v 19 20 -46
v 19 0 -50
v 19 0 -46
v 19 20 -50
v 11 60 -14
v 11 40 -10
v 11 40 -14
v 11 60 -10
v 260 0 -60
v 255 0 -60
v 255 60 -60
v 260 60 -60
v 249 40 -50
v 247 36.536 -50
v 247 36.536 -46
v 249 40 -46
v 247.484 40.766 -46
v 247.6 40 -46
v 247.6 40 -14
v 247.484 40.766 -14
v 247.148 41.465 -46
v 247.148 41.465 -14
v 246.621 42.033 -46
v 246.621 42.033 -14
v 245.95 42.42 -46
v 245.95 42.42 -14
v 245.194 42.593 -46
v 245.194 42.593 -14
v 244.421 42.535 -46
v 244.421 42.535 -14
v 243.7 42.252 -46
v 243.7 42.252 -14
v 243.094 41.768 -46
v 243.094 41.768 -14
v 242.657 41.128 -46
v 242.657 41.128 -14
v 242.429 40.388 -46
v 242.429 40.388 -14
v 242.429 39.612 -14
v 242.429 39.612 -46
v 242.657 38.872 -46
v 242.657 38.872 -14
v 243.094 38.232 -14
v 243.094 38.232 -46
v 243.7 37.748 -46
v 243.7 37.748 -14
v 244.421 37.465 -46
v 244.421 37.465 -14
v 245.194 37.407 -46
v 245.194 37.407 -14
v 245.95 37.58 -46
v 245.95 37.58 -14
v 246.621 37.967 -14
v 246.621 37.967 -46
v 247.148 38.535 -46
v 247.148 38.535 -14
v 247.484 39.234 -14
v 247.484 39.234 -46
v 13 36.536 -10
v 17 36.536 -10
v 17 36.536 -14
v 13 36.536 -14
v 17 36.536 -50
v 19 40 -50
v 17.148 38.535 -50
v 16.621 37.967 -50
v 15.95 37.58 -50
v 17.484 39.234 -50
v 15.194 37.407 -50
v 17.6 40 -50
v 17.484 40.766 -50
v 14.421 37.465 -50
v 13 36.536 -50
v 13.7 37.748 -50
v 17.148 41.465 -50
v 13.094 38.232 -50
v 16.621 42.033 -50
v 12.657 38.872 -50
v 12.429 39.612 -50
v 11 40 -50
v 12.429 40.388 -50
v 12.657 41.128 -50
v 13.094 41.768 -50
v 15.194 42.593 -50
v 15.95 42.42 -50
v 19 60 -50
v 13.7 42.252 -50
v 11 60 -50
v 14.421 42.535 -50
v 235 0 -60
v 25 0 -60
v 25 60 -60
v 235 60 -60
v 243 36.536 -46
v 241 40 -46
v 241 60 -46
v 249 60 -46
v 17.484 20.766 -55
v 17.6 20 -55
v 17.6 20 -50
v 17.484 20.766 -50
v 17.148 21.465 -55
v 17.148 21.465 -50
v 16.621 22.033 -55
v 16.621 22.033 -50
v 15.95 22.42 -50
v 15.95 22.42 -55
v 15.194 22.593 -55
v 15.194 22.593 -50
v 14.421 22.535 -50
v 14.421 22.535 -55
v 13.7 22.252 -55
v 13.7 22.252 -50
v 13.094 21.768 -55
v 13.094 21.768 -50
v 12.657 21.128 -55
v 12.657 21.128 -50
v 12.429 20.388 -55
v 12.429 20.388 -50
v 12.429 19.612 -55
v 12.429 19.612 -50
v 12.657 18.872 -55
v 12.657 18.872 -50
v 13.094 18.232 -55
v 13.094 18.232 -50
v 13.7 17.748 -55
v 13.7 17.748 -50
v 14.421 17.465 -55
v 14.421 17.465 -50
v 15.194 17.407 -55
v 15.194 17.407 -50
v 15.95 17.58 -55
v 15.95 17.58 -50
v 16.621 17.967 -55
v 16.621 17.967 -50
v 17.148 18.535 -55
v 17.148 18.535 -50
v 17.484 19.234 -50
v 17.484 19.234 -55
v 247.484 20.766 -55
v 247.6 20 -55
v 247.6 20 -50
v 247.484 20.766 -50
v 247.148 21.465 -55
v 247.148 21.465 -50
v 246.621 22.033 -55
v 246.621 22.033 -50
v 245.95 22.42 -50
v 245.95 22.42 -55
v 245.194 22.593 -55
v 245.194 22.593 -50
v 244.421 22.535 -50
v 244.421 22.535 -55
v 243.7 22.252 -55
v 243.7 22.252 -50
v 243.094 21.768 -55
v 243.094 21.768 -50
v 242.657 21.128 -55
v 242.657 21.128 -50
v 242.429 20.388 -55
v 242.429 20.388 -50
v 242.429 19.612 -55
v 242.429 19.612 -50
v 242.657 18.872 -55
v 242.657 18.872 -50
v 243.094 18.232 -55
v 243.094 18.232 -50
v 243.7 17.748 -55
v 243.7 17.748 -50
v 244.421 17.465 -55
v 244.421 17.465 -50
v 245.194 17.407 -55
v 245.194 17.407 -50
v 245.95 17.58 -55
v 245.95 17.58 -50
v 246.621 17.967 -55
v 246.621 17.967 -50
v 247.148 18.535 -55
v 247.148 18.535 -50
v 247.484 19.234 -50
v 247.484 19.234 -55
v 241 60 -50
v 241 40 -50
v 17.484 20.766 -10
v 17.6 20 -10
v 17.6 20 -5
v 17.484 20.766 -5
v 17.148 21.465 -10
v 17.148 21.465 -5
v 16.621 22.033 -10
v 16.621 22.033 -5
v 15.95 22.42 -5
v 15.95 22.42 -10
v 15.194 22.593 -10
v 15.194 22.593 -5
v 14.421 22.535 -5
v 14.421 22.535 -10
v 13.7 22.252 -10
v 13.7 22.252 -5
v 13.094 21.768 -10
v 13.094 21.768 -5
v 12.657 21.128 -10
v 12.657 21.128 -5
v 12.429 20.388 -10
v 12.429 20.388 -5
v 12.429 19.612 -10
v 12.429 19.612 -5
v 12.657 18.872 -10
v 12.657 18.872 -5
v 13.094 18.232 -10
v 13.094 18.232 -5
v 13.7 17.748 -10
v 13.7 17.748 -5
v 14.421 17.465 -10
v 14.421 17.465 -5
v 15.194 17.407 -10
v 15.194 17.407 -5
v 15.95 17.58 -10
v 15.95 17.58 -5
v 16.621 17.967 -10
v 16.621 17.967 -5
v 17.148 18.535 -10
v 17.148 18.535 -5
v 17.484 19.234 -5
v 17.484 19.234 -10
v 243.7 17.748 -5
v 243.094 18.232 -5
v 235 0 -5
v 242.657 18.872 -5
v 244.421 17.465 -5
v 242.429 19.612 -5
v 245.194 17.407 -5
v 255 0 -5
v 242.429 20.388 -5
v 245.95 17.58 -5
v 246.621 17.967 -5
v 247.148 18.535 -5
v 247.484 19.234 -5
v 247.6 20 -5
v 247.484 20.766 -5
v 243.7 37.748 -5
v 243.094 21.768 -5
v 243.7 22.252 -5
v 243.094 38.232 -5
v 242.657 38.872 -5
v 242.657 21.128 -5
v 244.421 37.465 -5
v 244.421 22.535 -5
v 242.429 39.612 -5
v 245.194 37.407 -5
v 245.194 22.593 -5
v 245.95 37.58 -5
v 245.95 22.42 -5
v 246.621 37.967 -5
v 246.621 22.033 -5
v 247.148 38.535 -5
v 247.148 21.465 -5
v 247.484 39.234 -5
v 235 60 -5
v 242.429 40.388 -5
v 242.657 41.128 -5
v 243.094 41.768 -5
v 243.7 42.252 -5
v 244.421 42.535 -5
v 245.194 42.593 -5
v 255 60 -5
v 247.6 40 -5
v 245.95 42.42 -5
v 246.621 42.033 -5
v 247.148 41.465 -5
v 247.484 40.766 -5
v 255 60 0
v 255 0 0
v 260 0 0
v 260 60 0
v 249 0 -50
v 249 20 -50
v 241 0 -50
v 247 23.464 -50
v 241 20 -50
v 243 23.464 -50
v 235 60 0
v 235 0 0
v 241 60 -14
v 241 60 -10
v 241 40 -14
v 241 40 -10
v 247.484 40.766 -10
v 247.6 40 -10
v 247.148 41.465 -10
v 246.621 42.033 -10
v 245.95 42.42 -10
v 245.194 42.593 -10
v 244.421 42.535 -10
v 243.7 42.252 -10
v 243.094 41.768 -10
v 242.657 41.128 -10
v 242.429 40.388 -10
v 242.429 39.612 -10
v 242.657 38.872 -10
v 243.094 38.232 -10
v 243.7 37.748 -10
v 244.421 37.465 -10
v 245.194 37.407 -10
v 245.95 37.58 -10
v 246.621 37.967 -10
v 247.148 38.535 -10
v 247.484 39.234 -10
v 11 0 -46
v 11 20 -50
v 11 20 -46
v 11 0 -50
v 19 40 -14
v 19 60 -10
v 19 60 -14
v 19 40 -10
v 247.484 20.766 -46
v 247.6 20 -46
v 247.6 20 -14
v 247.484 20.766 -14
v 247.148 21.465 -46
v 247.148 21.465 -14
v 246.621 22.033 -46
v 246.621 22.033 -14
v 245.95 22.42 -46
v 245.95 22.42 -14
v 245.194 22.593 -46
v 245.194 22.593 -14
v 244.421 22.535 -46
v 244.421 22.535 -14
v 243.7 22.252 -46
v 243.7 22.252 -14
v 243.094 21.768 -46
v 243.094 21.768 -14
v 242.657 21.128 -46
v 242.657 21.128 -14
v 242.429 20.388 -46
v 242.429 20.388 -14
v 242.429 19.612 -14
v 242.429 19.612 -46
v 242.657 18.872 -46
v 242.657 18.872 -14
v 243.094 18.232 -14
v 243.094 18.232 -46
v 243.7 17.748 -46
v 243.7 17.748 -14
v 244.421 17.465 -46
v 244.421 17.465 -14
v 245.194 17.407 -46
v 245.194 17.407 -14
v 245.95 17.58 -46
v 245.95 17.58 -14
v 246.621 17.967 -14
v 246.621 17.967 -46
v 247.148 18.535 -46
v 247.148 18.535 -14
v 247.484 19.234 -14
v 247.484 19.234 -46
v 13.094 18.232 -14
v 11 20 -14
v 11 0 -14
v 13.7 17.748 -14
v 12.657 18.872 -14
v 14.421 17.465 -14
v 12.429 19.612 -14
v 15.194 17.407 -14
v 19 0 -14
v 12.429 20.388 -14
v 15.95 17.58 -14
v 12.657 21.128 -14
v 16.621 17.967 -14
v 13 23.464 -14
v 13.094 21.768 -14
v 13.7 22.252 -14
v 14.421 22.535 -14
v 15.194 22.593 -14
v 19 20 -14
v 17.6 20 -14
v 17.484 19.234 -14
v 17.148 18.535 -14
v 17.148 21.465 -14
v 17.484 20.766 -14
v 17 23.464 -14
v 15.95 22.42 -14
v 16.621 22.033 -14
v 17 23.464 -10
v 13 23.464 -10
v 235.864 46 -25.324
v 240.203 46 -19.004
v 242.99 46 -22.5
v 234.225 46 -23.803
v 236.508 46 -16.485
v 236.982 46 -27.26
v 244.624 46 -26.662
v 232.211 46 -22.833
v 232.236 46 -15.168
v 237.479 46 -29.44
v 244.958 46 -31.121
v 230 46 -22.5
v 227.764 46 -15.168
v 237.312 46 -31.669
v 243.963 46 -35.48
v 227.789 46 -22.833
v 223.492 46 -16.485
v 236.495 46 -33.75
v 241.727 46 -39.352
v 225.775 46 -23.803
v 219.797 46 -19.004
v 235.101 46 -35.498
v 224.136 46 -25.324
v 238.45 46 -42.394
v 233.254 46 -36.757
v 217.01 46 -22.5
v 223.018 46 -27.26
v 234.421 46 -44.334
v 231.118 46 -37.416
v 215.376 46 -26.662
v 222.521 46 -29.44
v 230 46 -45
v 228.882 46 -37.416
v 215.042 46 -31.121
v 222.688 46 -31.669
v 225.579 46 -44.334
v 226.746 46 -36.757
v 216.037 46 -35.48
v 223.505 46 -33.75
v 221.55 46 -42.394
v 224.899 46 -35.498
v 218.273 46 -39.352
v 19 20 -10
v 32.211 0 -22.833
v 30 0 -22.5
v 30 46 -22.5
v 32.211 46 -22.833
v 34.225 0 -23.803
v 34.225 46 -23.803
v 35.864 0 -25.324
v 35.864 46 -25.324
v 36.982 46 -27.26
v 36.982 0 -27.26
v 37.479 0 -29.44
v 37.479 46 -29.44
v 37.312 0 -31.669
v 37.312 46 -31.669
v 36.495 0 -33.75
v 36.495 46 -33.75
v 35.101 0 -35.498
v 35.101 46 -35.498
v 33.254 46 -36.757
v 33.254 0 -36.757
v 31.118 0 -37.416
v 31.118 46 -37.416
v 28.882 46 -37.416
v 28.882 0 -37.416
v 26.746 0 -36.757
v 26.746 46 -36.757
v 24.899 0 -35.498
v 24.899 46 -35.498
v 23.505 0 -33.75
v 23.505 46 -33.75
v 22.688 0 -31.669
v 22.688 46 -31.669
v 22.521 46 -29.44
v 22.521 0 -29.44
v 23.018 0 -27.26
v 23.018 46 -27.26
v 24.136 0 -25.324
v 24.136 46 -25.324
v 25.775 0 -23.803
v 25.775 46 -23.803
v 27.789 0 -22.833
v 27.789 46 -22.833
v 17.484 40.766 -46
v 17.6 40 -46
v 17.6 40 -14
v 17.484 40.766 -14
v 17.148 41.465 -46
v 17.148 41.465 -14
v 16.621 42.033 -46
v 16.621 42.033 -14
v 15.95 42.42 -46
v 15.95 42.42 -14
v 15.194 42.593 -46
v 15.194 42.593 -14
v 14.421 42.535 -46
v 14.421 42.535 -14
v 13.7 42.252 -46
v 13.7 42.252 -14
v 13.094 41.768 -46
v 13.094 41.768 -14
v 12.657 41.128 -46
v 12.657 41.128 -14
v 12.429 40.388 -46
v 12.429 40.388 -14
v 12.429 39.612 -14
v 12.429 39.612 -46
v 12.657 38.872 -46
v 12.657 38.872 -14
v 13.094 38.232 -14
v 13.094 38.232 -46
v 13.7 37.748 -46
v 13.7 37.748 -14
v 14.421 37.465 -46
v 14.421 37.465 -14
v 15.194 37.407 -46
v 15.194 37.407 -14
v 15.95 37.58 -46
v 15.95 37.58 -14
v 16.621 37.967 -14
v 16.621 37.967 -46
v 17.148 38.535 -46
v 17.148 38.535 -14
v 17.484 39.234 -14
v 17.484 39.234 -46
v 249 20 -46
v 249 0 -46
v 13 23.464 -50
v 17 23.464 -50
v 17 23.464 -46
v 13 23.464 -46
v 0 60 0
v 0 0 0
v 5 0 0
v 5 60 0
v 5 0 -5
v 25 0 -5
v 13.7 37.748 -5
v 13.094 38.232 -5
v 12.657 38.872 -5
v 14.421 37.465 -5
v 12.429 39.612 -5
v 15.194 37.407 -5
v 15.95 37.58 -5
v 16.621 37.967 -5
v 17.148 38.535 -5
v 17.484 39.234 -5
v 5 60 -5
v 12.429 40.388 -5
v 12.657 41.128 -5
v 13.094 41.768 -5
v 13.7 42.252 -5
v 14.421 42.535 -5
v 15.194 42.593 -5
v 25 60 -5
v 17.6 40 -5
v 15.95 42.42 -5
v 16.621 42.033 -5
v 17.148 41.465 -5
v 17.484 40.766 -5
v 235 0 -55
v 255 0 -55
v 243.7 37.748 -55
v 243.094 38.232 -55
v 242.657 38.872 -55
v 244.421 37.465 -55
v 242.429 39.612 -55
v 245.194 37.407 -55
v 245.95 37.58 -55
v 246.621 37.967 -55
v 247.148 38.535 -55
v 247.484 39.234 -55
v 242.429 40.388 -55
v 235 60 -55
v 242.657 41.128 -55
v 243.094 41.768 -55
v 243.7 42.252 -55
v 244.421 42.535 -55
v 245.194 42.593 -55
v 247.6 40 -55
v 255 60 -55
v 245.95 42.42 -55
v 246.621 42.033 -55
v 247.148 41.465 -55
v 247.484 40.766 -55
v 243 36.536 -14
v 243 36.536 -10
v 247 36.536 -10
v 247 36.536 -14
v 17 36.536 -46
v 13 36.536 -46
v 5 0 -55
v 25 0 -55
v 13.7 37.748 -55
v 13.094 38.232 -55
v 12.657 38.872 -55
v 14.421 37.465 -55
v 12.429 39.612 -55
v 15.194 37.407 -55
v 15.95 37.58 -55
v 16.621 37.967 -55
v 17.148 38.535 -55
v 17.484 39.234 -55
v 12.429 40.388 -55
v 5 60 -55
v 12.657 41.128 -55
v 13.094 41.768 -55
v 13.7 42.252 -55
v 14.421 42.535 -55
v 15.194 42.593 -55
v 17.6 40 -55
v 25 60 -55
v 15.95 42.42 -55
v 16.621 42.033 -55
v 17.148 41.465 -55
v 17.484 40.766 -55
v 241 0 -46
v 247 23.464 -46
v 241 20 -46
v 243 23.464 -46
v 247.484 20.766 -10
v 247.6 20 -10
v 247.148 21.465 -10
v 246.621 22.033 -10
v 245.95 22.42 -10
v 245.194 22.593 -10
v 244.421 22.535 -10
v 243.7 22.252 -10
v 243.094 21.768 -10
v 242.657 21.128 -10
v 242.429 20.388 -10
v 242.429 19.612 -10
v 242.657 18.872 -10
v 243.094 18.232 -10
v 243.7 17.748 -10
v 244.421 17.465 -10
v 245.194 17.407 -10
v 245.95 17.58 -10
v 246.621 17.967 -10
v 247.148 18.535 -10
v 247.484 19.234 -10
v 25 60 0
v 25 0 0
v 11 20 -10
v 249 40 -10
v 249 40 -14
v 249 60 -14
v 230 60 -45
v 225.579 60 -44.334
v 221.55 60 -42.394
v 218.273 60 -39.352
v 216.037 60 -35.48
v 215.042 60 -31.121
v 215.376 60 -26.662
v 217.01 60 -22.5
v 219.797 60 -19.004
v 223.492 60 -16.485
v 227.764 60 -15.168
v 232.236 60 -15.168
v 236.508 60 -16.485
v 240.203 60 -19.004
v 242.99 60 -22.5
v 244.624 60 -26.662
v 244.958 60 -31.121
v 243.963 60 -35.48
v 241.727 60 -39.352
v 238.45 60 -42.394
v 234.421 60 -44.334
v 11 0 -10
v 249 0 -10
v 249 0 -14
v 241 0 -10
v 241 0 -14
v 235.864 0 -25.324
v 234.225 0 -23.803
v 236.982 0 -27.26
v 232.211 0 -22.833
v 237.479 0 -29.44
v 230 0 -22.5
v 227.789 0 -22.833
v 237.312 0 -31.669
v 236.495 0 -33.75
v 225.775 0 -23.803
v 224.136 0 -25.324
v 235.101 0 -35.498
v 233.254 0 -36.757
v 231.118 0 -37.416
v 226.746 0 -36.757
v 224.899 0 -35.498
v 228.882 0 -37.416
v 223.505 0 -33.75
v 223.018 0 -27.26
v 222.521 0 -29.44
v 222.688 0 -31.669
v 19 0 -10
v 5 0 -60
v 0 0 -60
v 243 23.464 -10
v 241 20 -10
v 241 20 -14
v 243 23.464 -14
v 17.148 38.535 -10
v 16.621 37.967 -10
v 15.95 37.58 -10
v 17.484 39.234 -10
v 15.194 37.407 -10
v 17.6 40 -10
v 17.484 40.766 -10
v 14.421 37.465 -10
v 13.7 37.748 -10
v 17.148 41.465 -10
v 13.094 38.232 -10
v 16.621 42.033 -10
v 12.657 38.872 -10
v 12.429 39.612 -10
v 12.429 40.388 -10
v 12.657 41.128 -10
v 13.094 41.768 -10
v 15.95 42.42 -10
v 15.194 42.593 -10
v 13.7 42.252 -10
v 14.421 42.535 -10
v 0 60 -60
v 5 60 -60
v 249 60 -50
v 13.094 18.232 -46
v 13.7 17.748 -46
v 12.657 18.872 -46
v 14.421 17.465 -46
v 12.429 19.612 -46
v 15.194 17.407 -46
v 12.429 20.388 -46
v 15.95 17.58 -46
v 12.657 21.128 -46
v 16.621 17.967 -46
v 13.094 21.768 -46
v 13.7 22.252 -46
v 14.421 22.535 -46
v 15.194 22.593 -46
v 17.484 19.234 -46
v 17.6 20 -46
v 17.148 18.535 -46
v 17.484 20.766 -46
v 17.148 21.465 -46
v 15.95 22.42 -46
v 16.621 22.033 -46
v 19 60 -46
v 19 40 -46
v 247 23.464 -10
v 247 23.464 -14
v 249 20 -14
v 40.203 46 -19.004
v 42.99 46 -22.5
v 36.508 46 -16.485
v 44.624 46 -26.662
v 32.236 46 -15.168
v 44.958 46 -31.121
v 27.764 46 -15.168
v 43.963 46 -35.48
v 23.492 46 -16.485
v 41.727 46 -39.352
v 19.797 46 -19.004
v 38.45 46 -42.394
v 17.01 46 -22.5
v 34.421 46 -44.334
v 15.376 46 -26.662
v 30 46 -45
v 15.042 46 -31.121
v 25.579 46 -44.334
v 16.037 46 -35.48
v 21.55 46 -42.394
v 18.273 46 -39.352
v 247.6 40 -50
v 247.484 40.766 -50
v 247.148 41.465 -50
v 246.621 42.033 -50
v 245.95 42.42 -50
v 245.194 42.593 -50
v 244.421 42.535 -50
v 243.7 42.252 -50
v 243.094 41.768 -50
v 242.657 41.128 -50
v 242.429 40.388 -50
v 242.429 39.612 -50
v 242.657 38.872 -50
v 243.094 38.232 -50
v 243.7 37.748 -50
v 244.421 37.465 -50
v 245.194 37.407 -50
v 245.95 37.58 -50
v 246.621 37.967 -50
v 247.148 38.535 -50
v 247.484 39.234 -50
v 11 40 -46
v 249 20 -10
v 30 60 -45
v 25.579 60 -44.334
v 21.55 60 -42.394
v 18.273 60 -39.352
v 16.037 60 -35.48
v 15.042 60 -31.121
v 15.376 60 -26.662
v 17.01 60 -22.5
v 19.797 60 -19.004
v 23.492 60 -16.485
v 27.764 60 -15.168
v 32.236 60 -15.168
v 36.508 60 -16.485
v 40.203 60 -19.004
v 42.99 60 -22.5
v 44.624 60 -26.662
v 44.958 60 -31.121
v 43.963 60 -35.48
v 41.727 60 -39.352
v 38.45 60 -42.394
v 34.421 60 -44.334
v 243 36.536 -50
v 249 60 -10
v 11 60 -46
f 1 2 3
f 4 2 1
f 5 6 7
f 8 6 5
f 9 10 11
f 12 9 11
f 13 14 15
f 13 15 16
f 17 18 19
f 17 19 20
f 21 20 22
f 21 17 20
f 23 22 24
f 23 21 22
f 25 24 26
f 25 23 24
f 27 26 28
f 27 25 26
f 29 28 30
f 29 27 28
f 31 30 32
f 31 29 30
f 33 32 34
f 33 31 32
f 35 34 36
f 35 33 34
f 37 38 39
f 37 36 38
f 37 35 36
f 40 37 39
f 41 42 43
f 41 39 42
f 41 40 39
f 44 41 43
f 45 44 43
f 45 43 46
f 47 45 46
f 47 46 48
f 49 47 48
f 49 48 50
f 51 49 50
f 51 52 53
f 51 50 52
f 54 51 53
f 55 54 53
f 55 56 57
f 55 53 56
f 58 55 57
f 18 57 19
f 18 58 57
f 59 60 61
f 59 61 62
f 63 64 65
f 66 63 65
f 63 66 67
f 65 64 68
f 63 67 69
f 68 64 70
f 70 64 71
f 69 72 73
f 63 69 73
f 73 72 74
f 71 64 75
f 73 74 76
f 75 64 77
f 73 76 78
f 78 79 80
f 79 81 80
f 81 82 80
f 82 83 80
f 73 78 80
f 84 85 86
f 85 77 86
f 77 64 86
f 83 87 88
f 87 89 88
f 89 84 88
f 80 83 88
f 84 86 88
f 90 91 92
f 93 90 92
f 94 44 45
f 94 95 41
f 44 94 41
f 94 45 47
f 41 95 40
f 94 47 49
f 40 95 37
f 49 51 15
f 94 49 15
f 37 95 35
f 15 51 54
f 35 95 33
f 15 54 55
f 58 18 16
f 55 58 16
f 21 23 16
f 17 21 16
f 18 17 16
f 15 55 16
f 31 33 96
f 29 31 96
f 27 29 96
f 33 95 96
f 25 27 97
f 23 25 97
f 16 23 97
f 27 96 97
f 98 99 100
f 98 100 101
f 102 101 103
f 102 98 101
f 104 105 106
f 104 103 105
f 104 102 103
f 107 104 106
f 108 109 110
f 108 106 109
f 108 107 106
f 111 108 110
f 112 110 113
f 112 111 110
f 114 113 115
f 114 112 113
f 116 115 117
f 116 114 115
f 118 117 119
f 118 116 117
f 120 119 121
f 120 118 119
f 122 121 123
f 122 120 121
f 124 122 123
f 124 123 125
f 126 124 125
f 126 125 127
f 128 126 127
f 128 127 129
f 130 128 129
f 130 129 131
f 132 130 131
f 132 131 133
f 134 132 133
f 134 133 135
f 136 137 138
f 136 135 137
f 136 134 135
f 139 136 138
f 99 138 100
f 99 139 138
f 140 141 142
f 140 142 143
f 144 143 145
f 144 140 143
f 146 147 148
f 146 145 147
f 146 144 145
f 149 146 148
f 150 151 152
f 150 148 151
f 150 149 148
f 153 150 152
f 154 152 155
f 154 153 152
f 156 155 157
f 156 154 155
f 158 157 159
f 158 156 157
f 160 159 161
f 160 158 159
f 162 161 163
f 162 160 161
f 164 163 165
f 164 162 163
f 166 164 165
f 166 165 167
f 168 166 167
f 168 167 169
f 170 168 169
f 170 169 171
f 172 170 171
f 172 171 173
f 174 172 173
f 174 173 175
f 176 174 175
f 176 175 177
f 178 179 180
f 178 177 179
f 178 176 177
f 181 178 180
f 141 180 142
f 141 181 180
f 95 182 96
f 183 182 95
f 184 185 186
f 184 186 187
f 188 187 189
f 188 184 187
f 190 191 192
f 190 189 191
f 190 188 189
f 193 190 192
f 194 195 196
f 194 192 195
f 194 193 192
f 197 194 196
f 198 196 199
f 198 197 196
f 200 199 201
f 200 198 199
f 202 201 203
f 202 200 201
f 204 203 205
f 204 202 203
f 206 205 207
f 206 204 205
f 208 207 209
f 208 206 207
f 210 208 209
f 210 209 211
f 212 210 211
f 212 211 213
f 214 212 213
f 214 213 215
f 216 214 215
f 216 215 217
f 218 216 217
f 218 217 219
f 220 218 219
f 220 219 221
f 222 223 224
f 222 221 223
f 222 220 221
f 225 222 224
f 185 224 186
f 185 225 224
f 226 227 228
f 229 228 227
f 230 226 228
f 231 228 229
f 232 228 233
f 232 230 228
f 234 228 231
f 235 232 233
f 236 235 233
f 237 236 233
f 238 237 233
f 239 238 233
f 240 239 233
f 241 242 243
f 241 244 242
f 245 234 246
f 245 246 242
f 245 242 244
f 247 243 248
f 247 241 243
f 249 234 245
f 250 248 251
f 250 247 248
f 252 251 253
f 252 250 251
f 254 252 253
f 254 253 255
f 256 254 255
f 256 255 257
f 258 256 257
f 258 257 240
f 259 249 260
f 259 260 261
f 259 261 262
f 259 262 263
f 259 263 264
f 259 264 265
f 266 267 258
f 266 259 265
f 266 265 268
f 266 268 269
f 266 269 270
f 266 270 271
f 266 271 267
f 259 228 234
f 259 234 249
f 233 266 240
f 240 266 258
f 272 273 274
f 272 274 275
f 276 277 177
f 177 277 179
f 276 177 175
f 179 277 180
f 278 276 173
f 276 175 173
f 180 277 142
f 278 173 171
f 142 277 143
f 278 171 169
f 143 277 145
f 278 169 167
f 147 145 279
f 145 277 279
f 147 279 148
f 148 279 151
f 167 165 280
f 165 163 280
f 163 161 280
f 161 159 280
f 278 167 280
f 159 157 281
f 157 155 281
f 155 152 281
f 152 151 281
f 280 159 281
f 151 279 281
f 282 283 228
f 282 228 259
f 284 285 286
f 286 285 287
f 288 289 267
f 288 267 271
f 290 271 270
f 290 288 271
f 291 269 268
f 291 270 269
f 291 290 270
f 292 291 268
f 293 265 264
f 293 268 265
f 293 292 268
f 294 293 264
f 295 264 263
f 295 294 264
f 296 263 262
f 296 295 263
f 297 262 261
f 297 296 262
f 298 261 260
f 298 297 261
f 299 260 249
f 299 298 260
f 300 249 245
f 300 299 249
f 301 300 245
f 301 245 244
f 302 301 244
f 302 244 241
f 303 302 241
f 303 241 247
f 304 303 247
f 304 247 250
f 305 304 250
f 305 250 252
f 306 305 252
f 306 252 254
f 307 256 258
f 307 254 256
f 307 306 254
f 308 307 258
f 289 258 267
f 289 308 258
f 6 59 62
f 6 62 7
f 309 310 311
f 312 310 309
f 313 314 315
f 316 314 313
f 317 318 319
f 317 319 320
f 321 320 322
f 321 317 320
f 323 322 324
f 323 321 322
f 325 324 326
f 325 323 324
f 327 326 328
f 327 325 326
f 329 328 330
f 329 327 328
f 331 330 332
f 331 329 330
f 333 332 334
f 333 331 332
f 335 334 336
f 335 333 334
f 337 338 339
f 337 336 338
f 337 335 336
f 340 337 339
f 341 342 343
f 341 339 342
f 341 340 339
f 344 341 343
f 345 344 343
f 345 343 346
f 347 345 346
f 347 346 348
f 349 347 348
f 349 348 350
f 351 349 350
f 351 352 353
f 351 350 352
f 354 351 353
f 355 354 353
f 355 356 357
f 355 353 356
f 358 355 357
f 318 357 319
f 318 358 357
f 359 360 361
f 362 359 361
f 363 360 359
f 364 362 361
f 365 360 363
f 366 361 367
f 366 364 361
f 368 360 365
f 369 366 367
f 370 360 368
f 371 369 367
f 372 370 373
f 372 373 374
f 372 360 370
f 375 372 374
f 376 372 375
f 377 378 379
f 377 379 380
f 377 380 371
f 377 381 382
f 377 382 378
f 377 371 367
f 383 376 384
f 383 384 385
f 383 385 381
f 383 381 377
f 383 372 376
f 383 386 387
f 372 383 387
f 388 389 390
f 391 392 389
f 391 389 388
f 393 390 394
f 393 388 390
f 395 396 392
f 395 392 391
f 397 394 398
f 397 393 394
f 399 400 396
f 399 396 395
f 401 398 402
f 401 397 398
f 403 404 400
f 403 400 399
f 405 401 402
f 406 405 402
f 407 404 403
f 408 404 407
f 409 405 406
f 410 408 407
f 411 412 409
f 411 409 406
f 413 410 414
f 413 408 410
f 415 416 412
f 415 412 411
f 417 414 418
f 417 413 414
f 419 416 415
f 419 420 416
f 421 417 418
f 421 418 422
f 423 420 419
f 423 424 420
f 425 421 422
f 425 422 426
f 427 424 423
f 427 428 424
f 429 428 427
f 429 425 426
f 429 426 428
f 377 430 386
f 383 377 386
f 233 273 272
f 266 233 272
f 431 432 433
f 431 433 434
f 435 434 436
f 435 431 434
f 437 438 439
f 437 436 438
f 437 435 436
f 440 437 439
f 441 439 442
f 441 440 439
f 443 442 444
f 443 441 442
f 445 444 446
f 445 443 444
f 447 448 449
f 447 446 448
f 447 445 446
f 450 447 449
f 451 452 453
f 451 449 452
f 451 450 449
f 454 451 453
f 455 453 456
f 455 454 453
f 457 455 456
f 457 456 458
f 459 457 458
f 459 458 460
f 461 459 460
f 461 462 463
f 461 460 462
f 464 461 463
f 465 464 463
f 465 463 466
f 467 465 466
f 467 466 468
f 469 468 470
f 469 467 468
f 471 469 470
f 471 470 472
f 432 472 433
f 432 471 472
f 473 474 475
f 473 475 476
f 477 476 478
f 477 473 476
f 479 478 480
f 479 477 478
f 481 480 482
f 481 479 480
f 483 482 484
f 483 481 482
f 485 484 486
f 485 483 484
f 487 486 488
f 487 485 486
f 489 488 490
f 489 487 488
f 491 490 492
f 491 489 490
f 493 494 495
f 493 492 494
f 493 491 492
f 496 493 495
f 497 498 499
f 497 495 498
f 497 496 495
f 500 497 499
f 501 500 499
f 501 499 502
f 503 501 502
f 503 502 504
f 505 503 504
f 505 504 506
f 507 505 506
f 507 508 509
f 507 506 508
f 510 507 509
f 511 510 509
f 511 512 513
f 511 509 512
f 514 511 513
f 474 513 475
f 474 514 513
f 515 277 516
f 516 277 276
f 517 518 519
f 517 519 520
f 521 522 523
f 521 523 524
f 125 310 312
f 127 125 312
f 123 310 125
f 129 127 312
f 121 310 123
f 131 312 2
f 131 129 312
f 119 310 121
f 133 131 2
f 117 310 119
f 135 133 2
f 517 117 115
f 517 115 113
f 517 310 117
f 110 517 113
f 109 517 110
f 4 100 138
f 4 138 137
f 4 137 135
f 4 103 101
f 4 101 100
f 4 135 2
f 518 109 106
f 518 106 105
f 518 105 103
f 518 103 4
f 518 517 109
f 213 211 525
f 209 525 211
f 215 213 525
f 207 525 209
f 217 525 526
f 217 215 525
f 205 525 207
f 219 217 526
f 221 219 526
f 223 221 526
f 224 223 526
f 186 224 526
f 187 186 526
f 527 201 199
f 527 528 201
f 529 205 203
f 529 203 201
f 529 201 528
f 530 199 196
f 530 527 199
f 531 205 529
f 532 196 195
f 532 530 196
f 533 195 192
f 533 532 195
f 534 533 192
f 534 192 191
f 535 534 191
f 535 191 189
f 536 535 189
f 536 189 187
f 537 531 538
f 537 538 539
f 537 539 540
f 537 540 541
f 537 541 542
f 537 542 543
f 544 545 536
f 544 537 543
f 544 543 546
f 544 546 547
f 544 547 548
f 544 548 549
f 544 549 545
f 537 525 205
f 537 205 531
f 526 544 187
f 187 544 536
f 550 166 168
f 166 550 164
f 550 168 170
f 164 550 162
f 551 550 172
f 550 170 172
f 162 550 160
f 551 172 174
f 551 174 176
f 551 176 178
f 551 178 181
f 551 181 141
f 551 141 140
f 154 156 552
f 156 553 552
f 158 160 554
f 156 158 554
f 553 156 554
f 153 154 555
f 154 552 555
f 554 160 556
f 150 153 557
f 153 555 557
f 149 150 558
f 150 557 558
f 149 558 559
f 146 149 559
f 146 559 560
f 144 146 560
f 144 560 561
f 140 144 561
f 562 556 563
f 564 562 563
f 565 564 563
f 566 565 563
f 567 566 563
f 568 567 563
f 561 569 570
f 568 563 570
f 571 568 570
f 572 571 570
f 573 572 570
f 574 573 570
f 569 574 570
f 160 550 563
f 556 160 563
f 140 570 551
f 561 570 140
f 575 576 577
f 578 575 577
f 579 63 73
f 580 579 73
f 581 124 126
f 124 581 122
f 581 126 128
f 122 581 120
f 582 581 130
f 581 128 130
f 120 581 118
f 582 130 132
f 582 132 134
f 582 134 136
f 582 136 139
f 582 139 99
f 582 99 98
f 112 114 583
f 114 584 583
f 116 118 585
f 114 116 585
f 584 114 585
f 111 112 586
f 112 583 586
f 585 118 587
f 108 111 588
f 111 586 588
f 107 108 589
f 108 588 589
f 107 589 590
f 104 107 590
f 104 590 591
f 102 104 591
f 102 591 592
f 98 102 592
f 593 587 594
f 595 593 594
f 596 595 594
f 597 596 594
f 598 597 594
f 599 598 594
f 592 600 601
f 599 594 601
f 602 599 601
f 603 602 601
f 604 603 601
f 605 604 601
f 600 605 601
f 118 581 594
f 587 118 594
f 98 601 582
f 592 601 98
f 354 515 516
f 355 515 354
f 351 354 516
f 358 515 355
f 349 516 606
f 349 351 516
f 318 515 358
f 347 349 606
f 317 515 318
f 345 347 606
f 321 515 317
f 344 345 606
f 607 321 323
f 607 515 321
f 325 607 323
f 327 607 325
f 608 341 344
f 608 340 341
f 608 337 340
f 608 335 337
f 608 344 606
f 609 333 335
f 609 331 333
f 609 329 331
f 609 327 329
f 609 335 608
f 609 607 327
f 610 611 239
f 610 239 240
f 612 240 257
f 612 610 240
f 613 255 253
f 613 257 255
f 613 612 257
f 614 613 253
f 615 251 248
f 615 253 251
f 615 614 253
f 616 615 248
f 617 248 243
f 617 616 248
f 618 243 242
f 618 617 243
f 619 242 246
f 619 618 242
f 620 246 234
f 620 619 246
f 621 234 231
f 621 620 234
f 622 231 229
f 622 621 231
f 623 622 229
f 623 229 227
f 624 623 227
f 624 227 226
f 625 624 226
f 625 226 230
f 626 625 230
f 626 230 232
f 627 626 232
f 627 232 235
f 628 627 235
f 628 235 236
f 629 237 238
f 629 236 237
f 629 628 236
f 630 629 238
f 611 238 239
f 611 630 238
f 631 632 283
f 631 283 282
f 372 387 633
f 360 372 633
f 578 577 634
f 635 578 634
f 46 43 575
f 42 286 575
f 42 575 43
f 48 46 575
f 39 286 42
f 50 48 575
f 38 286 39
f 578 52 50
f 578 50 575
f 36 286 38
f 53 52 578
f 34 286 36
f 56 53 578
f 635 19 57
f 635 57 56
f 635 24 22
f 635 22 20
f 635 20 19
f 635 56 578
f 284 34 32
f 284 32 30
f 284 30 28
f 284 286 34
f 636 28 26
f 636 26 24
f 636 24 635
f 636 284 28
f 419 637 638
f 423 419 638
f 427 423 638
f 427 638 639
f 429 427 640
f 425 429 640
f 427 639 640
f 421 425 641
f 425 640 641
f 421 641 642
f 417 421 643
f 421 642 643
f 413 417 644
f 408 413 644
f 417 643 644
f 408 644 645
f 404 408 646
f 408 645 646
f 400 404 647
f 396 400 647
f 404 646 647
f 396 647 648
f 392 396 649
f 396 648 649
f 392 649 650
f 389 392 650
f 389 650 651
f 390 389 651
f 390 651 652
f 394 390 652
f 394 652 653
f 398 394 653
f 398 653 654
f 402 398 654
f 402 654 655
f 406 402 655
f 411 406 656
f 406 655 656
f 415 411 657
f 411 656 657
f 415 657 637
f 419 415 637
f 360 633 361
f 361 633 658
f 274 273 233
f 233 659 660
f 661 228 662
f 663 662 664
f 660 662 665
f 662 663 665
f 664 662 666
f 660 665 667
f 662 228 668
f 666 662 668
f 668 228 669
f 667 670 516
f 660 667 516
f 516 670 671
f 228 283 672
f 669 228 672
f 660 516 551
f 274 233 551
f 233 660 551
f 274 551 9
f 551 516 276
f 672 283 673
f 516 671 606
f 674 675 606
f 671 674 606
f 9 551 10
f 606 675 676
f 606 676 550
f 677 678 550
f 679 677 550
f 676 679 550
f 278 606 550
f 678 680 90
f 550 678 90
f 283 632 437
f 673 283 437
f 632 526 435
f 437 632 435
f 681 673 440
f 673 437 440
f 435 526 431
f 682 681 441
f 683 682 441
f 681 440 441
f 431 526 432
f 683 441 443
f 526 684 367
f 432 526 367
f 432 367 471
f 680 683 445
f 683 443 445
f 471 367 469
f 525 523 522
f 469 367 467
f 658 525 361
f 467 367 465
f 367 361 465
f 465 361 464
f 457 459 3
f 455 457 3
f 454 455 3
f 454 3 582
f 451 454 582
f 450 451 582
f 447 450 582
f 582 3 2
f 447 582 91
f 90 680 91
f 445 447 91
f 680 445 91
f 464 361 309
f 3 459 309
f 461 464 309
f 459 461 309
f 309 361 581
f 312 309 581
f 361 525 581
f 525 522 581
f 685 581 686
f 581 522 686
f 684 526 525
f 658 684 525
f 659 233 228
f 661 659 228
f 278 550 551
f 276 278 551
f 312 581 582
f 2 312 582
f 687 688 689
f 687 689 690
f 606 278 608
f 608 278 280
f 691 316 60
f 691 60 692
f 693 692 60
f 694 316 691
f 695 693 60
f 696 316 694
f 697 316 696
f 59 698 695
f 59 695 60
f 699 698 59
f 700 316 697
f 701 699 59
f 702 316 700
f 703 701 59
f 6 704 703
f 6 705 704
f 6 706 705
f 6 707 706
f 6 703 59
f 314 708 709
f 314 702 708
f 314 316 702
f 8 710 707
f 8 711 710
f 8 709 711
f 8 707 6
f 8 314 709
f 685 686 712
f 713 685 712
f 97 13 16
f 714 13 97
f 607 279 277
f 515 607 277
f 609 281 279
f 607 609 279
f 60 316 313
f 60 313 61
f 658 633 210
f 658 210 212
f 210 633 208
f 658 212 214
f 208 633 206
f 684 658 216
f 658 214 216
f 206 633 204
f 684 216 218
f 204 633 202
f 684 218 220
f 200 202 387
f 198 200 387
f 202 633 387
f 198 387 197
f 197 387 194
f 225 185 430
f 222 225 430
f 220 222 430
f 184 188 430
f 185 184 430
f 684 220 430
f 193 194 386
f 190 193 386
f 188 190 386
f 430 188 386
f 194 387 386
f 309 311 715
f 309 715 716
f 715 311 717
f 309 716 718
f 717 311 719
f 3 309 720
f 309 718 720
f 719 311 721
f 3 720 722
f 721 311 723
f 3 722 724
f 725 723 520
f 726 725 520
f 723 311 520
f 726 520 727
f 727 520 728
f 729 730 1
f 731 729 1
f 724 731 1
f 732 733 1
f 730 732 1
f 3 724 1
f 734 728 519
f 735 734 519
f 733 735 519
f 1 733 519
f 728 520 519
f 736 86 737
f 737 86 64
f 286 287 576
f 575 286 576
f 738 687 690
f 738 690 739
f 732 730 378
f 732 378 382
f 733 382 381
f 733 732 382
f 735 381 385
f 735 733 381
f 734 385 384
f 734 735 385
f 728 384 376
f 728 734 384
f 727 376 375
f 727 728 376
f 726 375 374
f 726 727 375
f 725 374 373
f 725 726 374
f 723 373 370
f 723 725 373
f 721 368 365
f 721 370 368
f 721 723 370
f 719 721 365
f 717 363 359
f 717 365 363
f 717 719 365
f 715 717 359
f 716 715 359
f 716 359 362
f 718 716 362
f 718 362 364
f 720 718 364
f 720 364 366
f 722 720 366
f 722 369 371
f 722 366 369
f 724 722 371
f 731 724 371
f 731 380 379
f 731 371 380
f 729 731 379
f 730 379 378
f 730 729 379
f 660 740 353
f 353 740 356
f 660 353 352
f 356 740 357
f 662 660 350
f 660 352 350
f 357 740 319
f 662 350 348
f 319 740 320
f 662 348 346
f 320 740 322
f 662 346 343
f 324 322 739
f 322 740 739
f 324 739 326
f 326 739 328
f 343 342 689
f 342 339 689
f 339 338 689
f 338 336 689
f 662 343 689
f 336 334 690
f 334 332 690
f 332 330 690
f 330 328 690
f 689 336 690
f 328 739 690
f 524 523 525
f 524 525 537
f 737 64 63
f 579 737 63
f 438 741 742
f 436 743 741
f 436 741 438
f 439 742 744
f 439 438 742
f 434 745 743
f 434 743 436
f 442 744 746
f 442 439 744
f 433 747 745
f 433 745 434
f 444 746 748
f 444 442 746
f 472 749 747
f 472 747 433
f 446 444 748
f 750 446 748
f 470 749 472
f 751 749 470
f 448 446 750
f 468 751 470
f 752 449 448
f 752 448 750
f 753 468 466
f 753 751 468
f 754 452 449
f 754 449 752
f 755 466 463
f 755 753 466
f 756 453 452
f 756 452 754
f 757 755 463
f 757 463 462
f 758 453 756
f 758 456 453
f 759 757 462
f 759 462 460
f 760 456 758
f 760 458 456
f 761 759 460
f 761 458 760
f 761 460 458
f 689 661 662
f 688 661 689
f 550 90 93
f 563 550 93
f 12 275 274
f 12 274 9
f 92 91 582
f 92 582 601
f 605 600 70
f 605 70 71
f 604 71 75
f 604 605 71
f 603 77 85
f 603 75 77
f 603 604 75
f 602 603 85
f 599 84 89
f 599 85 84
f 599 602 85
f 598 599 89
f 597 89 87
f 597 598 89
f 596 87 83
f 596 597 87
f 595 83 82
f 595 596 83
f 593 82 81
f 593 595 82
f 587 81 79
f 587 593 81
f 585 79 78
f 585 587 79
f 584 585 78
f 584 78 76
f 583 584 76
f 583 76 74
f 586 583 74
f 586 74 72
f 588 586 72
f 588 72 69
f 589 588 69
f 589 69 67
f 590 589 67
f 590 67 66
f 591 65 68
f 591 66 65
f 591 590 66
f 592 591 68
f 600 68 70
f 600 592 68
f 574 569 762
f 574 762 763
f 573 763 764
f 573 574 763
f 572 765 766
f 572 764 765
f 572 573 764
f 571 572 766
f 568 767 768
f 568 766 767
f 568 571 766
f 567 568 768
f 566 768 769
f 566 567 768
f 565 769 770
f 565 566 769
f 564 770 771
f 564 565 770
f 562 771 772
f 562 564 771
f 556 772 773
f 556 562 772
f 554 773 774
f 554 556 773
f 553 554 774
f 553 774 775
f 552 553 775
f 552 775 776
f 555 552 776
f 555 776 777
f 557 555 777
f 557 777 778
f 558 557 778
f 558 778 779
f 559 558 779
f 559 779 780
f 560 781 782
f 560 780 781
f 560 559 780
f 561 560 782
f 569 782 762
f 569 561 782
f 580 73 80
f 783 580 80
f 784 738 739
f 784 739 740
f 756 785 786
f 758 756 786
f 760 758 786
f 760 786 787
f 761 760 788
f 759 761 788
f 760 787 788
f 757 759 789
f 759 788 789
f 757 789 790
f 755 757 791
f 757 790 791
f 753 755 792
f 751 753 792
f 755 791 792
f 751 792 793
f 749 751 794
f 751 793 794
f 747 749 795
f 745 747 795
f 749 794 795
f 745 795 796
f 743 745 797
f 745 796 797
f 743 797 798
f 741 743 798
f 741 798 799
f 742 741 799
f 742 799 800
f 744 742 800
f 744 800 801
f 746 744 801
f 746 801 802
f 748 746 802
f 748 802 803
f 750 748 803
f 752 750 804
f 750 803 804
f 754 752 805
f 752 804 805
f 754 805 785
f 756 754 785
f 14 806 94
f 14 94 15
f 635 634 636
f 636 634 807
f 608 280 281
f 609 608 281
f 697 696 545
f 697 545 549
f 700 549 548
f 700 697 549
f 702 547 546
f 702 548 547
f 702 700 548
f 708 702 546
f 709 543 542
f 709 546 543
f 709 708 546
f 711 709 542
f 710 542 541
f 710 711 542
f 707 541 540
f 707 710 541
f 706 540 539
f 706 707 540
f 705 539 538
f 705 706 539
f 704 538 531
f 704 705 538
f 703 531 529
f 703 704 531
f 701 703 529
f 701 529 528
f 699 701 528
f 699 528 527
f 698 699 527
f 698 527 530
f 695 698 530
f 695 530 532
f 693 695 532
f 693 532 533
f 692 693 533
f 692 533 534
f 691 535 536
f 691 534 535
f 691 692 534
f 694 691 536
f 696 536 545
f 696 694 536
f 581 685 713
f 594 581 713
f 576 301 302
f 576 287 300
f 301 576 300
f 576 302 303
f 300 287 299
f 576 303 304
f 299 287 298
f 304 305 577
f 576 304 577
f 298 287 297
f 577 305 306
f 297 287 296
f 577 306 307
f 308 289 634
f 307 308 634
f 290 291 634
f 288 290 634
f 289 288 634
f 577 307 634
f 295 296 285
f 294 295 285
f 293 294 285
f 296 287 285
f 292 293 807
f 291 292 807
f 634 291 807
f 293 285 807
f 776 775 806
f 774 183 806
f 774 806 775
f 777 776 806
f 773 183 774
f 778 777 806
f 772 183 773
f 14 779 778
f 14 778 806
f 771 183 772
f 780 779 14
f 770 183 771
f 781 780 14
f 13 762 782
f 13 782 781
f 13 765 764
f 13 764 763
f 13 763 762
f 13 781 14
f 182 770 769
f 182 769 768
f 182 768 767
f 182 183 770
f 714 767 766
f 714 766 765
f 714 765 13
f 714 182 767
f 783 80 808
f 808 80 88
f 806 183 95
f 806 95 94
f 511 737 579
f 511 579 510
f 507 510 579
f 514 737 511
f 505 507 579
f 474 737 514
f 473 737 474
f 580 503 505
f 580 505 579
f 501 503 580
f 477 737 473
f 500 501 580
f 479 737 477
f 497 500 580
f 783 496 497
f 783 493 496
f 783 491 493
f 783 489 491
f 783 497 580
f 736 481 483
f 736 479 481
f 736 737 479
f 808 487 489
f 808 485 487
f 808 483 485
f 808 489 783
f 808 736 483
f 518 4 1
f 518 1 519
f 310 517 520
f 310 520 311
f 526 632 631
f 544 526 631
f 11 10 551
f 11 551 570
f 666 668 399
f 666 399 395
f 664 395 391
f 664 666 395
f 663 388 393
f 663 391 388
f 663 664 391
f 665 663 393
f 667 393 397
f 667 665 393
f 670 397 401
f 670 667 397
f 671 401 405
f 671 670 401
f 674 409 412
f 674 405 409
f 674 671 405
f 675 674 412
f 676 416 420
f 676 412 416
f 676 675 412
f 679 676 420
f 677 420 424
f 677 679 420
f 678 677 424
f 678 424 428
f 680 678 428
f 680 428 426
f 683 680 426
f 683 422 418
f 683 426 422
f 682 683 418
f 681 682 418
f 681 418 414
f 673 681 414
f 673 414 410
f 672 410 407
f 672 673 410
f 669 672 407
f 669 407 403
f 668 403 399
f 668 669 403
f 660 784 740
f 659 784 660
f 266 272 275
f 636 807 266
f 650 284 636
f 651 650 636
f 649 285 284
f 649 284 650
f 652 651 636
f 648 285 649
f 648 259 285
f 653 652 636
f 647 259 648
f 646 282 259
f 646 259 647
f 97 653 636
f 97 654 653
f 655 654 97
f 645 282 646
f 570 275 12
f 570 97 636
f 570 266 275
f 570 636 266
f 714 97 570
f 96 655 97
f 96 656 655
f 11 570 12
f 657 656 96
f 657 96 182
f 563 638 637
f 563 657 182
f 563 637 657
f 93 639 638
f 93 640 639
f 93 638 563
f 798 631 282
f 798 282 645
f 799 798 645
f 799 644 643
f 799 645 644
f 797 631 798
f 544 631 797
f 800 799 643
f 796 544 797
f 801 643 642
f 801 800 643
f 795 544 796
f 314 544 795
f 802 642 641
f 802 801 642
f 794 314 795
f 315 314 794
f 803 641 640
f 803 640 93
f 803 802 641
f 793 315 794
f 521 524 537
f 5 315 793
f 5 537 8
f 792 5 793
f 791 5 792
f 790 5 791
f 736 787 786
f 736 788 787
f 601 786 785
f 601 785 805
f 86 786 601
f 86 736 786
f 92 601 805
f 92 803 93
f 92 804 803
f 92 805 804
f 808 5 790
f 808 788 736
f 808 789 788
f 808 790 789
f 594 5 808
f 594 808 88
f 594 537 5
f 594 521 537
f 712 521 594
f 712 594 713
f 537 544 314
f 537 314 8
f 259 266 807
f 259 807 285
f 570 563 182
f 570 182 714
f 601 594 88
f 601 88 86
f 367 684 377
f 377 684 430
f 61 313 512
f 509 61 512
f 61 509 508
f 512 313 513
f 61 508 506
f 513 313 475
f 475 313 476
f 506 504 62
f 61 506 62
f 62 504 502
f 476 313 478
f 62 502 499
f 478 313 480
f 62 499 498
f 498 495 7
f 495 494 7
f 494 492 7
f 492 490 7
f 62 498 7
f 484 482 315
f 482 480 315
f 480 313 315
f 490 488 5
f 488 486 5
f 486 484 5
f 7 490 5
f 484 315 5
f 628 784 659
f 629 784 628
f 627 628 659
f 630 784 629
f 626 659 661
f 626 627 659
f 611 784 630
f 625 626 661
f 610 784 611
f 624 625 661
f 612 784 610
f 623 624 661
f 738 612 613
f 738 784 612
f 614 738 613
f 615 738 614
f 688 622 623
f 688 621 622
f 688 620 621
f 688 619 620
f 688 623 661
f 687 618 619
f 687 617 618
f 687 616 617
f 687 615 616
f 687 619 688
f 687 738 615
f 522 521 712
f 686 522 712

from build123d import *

# Parameters (mm, degrees)
SKETCH1_W               = 60
SKETCH1_H               = 60
BOSS_EXTRUDE1_DEPTH     = 260
CUT_EXTRUDE1_DEPTH      = 274.495886624
CUT_EXTRUDE1_DEPTH_BACK = 274.495886624
SKETCH2_R               = 7.5
CUT_EXTRUDE2_START      = 60
SKETCH3_R               = 15
CUT_EXTRUDE2_DEPTH      = 14
SKETCH4_W               = 20
SKETCH4_H               = 60
CUT_EXTRUDE3_DEPTH      = 5
CUT_EXTRUDE4_DEPTH      = 274.495886624
CUT_EXTRUDE4_DEPTH_BACK = 274.495886624
SKETCH5_R               = 2.6
CUT_EXTRUDE5_START      = -10
CUT_EXTRUDE5_DEPTH      = 4


with BuildPart() as part:
    # Sketch1 → Boss-Extrude1 (new body)
    with BuildSketch(Plane(origin=(0, 0, 0), x_dir=(0, 0, -1), z_dir=(1, 0, 0))):
        with Locations((30, 30)):
            Rectangle(SKETCH1_W, SKETCH1_H)
    extrude(amount=BOSS_EXTRUDE1_DEPTH)

    # Sketch2 → Cut-Extrude1 (cut, two sides: drawn at the far end of the back side and taken through both)
    with BuildSketch(Plane(origin=(0, 0, 0), x_dir=(1, 0, 0), z_dir=(0, 1, 0)).offset(-CUT_EXTRUDE1_DEPTH_BACK)):
        with Locations(Location((30, 30, 0), (0, 0, 270))):
            Circle(SKETCH2_R)
        with Locations(Location((230, 30, 0), (0, 0, 270))):
            Circle(SKETCH2_R)
    extrude(amount=CUT_EXTRUDE1_DEPTH + CUT_EXTRUDE1_DEPTH_BACK, mode=Mode.SUBTRACT)

    # Sketch3 → Cut-Extrude2 (cut)
    with BuildSketch(Plane(origin=(0, 0, 0), x_dir=(1, 0, 0), z_dir=(0, 1, 0)).offset(CUT_EXTRUDE2_START)):
        with Locations(Location((30, 30, 0), (0, 0, 90))):
            Circle(SKETCH3_R)
        with Locations(Location((230, 30, 0), (0, 0, 90))):
            Circle(SKETCH3_R)
    extrude(amount=-CUT_EXTRUDE2_DEPTH, mode=Mode.SUBTRACT)

    # Sketch4 → Cut-Extrude3 (cut)
    with BuildSketch(Plane.XY):
        with Locations((15, 30)):
            Rectangle(SKETCH4_W, SKETCH4_H)
        with Locations((245, 30)):
            Rectangle(SKETCH4_W, SKETCH4_H)
    cut_extrude3 = extrude(amount=-CUT_EXTRUDE3_DEPTH, mode=Mode.SUBTRACT)

    # Sketch5 → Cut-Extrude4 (cut, two sides: drawn at the far end of the back side and taken through both)
    with BuildSketch(Plane.XY.offset(-CUT_EXTRUDE4_DEPTH_BACK)):
        with Locations((15, 20)):
            Circle(SKETCH5_R)
        with Locations((15, 40)):
            Circle(SKETCH5_R)
        with Locations((245, 40)):
            Circle(SKETCH5_R)
        with Locations((245, 20)):
            Circle(SKETCH5_R)
    extrude(amount=CUT_EXTRUDE4_DEPTH + CUT_EXTRUDE4_DEPTH_BACK, mode=Mode.SUBTRACT)

    # Mirror2: Cut-Extrude3 across plane
    add(cut_extrude3.mirror(Plane.XY.offset(-30)), mode=Mode.SUBTRACT)

    # Sketch6 → Cut-Extrude5 (cut)
    with BuildSketch(Plane.XY.offset(CUT_EXTRUDE5_START)):
        Polygon((11, 20), (11, 0), (19, 0), (19, 20), (17, 23.464101615), (13, 23.464101615), align=None)
        Polygon((19, 60), (19, 40), (17, 36.535898385), (13, 36.535898385), (11, 40), (11, 60), align=None)
        Polygon((249, 40), (249, 60), (241, 60), (241, 40), (243, 36.535898385), (247, 36.535898385), align=None)
        Polygon((241, 0), (241, 20), (243, 23.464101615), (247, 23.464101615), (249, 20), (249, 0), align=None)
    cut_extrude5 = extrude(amount=-CUT_EXTRUDE5_DEPTH, mode=Mode.SUBTRACT)

    # Mirror3: Cut-Extrude5 across plane
    add(cut_extrude5.mirror(Plane.XY.offset(-30)), mode=Mode.SUBTRACT)


solid = part.part
